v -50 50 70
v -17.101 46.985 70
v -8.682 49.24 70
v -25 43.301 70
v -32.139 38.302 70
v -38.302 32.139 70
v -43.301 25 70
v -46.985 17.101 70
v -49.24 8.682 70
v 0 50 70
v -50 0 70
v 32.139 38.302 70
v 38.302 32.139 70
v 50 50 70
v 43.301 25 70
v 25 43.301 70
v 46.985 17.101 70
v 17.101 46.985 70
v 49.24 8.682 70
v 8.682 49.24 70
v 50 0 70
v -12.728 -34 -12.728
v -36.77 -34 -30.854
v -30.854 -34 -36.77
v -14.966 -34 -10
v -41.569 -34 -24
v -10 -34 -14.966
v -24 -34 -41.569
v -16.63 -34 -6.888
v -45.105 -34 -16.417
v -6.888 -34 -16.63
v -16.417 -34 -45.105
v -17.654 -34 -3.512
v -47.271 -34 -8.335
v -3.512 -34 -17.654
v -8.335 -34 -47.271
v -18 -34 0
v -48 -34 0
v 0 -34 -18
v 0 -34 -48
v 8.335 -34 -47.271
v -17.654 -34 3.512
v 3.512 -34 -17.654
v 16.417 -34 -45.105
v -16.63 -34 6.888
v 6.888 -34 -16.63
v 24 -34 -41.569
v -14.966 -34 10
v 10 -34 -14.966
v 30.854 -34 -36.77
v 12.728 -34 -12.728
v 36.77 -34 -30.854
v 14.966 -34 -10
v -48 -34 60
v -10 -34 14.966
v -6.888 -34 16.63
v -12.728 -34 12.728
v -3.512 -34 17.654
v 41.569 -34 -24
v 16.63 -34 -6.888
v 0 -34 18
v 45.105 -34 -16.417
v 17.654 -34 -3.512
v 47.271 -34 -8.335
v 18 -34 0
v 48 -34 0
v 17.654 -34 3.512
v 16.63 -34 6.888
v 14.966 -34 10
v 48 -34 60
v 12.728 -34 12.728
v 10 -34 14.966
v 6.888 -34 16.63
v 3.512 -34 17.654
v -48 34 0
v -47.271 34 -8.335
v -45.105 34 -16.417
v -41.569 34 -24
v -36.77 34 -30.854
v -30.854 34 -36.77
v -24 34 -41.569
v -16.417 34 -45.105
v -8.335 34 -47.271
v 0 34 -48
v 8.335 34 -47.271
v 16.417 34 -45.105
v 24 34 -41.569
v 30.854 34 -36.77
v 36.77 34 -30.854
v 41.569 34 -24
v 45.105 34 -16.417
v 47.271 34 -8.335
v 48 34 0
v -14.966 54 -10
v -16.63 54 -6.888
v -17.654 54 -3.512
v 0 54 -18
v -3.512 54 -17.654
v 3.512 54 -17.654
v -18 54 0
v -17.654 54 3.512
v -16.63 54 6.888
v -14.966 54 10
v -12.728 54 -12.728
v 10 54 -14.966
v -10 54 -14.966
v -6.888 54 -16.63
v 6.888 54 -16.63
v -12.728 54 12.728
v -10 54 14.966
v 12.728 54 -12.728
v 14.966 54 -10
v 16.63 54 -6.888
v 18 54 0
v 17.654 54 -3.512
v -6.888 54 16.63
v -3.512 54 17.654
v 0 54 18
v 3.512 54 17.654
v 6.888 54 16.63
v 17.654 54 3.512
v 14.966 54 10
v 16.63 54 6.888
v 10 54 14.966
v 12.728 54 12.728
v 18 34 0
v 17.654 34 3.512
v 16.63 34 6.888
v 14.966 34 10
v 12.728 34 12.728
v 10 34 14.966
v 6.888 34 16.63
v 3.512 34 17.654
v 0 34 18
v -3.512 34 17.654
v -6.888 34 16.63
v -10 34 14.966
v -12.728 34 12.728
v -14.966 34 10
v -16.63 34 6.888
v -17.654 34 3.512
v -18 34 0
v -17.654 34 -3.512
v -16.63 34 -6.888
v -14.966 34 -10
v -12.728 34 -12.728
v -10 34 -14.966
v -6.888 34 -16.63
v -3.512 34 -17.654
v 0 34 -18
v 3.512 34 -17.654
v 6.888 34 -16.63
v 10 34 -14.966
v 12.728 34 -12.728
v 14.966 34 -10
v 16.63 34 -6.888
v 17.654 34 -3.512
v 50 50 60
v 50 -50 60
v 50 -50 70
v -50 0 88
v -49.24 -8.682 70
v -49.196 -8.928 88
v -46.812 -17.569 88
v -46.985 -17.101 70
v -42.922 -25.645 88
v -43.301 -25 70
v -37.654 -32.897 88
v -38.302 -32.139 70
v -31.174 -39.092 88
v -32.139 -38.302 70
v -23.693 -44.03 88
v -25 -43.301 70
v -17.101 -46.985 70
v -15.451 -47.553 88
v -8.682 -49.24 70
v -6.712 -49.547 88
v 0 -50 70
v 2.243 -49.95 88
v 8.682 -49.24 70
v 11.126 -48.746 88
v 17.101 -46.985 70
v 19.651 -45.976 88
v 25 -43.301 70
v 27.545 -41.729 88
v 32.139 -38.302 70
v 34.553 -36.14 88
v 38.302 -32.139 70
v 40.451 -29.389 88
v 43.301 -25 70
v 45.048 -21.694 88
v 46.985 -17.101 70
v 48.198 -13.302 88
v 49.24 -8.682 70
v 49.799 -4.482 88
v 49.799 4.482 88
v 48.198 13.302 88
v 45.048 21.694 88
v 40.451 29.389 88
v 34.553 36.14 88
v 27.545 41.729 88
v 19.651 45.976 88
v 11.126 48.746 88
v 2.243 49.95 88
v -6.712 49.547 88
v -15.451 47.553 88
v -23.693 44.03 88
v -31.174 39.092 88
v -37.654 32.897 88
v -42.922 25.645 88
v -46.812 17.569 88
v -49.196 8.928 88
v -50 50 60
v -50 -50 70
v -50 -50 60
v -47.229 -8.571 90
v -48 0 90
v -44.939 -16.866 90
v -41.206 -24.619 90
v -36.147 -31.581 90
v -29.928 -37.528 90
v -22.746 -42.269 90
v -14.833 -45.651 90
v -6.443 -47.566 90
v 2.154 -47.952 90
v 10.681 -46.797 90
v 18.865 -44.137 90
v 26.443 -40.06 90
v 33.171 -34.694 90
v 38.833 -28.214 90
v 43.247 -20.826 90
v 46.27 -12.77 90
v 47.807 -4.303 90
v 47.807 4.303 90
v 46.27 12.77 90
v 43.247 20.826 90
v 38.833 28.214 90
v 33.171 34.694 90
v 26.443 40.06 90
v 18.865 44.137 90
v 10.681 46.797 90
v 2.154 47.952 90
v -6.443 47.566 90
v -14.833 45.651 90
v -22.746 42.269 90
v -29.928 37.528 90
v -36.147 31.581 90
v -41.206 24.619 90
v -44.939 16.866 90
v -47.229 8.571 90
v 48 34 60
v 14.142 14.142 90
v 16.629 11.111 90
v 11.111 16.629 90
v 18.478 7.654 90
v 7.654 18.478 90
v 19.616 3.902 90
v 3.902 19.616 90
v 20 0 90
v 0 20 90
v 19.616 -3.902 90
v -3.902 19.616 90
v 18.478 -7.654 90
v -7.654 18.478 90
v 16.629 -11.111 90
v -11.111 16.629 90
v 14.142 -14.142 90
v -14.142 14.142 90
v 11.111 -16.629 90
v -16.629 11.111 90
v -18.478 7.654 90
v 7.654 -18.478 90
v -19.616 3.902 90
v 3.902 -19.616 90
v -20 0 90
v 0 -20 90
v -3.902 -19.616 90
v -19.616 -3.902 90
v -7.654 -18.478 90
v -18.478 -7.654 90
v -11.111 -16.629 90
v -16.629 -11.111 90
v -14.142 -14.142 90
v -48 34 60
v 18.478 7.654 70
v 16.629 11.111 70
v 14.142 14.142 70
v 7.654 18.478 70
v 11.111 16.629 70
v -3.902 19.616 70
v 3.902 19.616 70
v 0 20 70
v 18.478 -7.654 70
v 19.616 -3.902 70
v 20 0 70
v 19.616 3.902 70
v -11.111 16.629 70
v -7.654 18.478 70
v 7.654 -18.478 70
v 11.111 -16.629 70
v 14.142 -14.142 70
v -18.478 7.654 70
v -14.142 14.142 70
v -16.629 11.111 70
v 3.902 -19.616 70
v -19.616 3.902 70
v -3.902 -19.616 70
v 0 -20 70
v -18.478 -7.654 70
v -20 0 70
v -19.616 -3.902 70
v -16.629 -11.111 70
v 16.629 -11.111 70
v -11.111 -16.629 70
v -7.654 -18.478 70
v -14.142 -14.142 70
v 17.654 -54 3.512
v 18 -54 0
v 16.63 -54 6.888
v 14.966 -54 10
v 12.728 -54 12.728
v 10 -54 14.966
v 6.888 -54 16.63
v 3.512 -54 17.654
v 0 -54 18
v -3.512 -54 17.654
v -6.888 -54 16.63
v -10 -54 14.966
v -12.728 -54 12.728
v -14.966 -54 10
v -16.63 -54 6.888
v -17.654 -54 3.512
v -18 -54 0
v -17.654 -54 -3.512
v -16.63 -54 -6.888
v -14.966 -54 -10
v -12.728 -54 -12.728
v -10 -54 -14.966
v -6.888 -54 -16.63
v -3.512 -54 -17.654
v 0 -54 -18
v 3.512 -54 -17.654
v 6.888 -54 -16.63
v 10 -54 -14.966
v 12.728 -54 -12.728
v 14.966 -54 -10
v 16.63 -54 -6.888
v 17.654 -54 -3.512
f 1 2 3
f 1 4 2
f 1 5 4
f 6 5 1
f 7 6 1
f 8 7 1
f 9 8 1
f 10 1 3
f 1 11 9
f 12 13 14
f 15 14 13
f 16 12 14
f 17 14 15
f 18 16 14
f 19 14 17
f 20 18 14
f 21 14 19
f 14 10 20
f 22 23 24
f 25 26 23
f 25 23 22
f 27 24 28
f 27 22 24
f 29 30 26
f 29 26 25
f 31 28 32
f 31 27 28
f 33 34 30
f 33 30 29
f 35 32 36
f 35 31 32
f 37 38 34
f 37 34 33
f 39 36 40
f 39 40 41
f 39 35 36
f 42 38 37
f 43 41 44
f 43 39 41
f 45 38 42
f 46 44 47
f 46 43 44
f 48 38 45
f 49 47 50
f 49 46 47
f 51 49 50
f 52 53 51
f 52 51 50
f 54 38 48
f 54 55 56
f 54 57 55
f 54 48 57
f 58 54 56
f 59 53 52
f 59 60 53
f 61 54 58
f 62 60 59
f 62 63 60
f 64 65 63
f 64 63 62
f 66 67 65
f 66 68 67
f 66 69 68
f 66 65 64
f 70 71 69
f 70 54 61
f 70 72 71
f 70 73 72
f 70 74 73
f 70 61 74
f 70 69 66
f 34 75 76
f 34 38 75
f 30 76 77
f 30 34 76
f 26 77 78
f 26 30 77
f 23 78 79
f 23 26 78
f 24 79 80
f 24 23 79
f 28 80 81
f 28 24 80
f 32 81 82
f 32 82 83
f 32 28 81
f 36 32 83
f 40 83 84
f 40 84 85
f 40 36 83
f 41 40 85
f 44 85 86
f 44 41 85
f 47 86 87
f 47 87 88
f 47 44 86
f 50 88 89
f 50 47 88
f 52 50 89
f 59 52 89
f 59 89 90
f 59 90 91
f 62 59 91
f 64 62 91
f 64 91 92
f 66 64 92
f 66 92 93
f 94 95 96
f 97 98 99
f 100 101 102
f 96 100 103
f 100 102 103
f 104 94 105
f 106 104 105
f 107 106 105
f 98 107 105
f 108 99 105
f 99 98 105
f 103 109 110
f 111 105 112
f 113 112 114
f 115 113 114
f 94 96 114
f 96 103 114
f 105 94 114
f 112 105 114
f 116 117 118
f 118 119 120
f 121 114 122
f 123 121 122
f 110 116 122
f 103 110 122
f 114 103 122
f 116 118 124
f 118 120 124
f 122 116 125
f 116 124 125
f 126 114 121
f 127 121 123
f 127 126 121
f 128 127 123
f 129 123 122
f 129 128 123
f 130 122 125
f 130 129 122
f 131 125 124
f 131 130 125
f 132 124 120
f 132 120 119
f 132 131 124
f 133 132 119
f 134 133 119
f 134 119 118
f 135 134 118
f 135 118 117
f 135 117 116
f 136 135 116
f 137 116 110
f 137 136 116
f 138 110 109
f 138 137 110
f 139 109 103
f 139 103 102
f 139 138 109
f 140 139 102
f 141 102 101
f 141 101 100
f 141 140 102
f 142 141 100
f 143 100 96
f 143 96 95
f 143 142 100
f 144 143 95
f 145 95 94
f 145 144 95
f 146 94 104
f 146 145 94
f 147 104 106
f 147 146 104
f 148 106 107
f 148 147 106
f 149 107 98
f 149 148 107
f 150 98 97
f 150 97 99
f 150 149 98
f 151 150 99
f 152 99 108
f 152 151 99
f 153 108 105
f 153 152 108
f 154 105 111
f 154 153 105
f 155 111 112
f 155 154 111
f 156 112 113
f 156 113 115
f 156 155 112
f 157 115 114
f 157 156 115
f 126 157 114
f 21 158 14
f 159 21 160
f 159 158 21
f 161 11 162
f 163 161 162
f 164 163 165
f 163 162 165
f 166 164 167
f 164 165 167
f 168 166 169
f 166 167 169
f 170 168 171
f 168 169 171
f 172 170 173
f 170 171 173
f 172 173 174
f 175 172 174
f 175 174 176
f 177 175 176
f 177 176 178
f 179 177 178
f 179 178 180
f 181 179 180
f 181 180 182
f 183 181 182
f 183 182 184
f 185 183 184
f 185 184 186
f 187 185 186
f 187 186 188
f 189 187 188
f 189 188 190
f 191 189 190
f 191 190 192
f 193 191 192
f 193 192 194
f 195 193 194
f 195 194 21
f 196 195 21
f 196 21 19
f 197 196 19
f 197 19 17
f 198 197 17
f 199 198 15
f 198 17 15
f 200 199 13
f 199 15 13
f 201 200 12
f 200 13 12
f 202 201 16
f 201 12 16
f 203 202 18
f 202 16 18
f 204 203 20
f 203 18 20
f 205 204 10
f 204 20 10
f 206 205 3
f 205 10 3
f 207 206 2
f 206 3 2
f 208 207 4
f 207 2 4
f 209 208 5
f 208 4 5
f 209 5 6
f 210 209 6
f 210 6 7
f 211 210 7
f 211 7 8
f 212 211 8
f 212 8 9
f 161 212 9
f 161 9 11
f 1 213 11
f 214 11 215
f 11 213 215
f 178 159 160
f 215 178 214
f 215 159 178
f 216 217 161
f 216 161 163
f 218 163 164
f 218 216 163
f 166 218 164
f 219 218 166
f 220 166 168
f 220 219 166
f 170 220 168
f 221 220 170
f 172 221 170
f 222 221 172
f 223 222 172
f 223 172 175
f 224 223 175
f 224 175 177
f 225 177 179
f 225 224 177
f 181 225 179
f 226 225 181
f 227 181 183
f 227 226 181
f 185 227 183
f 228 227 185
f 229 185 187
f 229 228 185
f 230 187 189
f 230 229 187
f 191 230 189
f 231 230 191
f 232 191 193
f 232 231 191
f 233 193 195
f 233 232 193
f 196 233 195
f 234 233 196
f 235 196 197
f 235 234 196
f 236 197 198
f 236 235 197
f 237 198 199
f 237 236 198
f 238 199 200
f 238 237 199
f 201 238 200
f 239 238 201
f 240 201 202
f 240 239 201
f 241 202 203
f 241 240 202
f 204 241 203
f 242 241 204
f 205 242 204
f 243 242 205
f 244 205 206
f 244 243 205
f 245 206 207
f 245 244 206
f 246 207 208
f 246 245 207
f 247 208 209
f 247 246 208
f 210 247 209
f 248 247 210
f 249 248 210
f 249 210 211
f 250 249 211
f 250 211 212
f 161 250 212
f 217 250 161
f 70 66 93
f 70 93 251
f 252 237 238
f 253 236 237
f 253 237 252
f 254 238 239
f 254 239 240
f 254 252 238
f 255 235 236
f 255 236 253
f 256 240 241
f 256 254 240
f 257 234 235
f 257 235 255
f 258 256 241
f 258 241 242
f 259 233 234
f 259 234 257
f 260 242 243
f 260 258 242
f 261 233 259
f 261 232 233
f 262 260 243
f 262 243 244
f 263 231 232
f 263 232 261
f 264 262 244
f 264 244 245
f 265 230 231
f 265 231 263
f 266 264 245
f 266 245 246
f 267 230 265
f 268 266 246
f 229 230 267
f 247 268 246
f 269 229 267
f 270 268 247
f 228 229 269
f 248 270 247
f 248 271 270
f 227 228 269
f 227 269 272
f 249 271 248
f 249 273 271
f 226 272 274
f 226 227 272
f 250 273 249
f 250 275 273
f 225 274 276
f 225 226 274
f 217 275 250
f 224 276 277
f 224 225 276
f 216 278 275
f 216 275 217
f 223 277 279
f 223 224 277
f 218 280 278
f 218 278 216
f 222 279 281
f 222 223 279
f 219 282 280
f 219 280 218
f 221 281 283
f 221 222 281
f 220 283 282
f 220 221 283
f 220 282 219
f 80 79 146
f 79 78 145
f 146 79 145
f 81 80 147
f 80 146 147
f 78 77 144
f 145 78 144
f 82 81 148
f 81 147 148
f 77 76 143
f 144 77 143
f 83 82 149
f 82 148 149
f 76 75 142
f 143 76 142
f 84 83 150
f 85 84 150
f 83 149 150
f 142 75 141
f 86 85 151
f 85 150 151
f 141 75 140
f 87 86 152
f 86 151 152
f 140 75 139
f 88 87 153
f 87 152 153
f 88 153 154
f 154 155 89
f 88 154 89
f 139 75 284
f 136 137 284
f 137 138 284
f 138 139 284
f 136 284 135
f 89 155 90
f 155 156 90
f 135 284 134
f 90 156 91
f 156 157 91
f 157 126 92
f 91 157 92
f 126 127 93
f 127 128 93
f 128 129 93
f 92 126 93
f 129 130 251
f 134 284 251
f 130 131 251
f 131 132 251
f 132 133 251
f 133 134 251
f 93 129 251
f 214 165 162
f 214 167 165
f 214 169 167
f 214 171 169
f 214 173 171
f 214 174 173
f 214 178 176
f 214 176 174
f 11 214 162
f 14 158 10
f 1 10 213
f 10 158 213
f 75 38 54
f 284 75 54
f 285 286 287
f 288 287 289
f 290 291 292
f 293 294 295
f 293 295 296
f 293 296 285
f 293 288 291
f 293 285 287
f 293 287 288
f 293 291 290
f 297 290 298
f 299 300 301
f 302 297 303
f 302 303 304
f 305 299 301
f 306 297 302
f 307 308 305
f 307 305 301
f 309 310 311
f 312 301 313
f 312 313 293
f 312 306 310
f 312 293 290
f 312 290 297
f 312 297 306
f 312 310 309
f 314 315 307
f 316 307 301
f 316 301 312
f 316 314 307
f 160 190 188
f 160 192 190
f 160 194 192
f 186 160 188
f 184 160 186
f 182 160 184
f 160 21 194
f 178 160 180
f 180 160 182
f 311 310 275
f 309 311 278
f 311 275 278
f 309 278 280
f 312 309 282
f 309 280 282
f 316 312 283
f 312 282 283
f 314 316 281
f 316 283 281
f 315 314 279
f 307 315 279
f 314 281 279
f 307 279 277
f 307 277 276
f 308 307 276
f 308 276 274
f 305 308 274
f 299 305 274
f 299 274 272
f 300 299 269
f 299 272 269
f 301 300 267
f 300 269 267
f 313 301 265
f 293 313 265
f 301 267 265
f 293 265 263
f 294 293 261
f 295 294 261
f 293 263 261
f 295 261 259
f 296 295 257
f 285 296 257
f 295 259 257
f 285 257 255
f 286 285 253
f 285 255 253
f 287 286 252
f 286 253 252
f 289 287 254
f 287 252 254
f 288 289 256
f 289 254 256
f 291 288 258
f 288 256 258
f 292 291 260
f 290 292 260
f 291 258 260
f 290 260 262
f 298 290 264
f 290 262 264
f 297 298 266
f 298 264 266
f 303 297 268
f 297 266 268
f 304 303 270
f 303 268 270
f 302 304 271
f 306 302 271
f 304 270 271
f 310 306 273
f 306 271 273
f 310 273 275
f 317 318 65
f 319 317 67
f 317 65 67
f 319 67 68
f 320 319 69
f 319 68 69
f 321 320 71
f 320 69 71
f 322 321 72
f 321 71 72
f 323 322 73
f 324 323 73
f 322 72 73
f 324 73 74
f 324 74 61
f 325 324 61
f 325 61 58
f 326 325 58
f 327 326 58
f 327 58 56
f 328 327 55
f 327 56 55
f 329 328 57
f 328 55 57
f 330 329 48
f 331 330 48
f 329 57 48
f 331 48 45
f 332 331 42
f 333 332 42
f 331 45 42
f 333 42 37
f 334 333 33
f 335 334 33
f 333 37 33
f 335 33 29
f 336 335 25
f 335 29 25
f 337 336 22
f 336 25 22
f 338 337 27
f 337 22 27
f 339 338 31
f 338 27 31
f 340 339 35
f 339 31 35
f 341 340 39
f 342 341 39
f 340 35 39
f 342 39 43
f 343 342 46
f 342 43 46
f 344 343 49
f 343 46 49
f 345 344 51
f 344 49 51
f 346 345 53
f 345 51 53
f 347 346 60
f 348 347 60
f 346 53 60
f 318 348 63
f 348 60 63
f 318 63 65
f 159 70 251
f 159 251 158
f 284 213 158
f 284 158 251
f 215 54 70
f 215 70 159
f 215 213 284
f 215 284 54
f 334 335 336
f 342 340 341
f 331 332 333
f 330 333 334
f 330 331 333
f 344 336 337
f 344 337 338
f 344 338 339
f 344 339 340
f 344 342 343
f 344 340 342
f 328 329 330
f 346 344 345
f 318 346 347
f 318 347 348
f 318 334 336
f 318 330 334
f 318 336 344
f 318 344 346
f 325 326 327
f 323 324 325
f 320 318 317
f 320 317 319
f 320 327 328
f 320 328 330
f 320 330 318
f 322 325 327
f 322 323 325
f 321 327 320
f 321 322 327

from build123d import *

# Parameters (mm, degrees)
PAD_DEPTH       = 34
SKETCH001_R     = 18
PAD001_DEPTH    = 20
SKETCH002_W     = 100
SKETCH002_H     = 100
PAD002_DEPTH    = 20
SKETCH003_R     = 50
PAD003_DEPTH    = 20
CHAMFER_SIZE    = 2
SKETCH004_R     = 20
POCKET_DEPTH    = 20
SKETCH005_W     = 96
SKETCH005_H     = 10
POCKET001_DEPTH = 16
SKETCH006_W     = 10
SKETCH006_H     = 100
POCKET002_DEPTH = 2


with BuildPart() as part:
    # Sketch → Pad (new body, symmetric)
    with BuildSketch(Plane.XZ):
        with BuildLine():
            ThreePointArc((-48, 0), (0, -48), (48, 0))
            Line((48, 50), (48, 0))
            Line((-48, 50), (48, 50))
            Line((-48, 0), (-48, 50))
        make_face()
    extrude(amount=PAD_DEPTH, both=True)

    # Sketch001 (on Face6 of Pad) → Pad001 (join)
    with BuildSketch(Plane.XZ.offset(34)):
        Circle(SKETCH001_R)
    pad001 = extrude(amount=PAD001_DEPTH)

    # Mirrored: Pad001 across XZ
    add(pad001.mirror(Plane.XZ))

    # Sketch002 (on Face6 of Mirrored) → Pad002 (join)
    with BuildSketch(Plane(origin=(0, 0, 50), x_dir=(-1, 0, 0), z_dir=(0, 0, 1))):
        Rectangle(SKETCH002_W, SKETCH002_H)
    extrude(amount=PAD002_DEPTH)

    # Sketch003 (on Face5 of Pad002) → Pad003 (join)
    with BuildSketch(Plane(origin=(0, 0, 70), x_dir=(-1, 0, 0), z_dir=(0, 0, 1))):
        Circle(SKETCH003_R)
    extrude(amount=PAD003_DEPTH)

    # Chamfer
    chamfer_edges = [part.edges().sort_by_distance(p)[0] for p in [
        (50, 0, 90),
    ]]
    chamfer(chamfer_edges, length=CHAMFER_SIZE)

    # Sketch004 (on Face7 of Chamfer) → Pocket (cut)
    with BuildSketch(Plane(origin=(0, 0, 90), x_dir=(-1, 0, 0), z_dir=(0, 0, 1))):
        Circle(SKETCH004_R)
    extrude(amount=-POCKET_DEPTH, mode=Mode.SUBTRACT)

    # Sketch005 (on Face11 of Pocket) → Pocket001 (cut)
    with BuildSketch(Plane.XZ.offset(50)):
        with Locations((0, 55)):
            Rectangle(SKETCH005_W, SKETCH005_H)
    pocket001 = extrude(amount=-POCKET001_DEPTH, mode=Mode.SUBTRACT)

    # Mirrored001: Pocket001 across XZ
    add(pocket001.mirror(Plane.XZ), mode=Mode.SUBTRACT)

    # Sketch006 (on Face10 of Mirrored001) → Pocket002 (cut)
    with BuildSketch(Plane(origin=(50, 0, 0), x_dir=(0, 0, 1), z_dir=(1, 0, 0))):
        with Locations((55, 0)):
            Rectangle(SKETCH006_W, SKETCH006_H)
    pocket002 = extrude(amount=-POCKET002_DEPTH, mode=Mode.SUBTRACT)

    # Mirrored002: Pocket002 across YZ
    add(pocket002.mirror(Plane.YZ), mode=Mode.SUBTRACT)


solid = part.part
